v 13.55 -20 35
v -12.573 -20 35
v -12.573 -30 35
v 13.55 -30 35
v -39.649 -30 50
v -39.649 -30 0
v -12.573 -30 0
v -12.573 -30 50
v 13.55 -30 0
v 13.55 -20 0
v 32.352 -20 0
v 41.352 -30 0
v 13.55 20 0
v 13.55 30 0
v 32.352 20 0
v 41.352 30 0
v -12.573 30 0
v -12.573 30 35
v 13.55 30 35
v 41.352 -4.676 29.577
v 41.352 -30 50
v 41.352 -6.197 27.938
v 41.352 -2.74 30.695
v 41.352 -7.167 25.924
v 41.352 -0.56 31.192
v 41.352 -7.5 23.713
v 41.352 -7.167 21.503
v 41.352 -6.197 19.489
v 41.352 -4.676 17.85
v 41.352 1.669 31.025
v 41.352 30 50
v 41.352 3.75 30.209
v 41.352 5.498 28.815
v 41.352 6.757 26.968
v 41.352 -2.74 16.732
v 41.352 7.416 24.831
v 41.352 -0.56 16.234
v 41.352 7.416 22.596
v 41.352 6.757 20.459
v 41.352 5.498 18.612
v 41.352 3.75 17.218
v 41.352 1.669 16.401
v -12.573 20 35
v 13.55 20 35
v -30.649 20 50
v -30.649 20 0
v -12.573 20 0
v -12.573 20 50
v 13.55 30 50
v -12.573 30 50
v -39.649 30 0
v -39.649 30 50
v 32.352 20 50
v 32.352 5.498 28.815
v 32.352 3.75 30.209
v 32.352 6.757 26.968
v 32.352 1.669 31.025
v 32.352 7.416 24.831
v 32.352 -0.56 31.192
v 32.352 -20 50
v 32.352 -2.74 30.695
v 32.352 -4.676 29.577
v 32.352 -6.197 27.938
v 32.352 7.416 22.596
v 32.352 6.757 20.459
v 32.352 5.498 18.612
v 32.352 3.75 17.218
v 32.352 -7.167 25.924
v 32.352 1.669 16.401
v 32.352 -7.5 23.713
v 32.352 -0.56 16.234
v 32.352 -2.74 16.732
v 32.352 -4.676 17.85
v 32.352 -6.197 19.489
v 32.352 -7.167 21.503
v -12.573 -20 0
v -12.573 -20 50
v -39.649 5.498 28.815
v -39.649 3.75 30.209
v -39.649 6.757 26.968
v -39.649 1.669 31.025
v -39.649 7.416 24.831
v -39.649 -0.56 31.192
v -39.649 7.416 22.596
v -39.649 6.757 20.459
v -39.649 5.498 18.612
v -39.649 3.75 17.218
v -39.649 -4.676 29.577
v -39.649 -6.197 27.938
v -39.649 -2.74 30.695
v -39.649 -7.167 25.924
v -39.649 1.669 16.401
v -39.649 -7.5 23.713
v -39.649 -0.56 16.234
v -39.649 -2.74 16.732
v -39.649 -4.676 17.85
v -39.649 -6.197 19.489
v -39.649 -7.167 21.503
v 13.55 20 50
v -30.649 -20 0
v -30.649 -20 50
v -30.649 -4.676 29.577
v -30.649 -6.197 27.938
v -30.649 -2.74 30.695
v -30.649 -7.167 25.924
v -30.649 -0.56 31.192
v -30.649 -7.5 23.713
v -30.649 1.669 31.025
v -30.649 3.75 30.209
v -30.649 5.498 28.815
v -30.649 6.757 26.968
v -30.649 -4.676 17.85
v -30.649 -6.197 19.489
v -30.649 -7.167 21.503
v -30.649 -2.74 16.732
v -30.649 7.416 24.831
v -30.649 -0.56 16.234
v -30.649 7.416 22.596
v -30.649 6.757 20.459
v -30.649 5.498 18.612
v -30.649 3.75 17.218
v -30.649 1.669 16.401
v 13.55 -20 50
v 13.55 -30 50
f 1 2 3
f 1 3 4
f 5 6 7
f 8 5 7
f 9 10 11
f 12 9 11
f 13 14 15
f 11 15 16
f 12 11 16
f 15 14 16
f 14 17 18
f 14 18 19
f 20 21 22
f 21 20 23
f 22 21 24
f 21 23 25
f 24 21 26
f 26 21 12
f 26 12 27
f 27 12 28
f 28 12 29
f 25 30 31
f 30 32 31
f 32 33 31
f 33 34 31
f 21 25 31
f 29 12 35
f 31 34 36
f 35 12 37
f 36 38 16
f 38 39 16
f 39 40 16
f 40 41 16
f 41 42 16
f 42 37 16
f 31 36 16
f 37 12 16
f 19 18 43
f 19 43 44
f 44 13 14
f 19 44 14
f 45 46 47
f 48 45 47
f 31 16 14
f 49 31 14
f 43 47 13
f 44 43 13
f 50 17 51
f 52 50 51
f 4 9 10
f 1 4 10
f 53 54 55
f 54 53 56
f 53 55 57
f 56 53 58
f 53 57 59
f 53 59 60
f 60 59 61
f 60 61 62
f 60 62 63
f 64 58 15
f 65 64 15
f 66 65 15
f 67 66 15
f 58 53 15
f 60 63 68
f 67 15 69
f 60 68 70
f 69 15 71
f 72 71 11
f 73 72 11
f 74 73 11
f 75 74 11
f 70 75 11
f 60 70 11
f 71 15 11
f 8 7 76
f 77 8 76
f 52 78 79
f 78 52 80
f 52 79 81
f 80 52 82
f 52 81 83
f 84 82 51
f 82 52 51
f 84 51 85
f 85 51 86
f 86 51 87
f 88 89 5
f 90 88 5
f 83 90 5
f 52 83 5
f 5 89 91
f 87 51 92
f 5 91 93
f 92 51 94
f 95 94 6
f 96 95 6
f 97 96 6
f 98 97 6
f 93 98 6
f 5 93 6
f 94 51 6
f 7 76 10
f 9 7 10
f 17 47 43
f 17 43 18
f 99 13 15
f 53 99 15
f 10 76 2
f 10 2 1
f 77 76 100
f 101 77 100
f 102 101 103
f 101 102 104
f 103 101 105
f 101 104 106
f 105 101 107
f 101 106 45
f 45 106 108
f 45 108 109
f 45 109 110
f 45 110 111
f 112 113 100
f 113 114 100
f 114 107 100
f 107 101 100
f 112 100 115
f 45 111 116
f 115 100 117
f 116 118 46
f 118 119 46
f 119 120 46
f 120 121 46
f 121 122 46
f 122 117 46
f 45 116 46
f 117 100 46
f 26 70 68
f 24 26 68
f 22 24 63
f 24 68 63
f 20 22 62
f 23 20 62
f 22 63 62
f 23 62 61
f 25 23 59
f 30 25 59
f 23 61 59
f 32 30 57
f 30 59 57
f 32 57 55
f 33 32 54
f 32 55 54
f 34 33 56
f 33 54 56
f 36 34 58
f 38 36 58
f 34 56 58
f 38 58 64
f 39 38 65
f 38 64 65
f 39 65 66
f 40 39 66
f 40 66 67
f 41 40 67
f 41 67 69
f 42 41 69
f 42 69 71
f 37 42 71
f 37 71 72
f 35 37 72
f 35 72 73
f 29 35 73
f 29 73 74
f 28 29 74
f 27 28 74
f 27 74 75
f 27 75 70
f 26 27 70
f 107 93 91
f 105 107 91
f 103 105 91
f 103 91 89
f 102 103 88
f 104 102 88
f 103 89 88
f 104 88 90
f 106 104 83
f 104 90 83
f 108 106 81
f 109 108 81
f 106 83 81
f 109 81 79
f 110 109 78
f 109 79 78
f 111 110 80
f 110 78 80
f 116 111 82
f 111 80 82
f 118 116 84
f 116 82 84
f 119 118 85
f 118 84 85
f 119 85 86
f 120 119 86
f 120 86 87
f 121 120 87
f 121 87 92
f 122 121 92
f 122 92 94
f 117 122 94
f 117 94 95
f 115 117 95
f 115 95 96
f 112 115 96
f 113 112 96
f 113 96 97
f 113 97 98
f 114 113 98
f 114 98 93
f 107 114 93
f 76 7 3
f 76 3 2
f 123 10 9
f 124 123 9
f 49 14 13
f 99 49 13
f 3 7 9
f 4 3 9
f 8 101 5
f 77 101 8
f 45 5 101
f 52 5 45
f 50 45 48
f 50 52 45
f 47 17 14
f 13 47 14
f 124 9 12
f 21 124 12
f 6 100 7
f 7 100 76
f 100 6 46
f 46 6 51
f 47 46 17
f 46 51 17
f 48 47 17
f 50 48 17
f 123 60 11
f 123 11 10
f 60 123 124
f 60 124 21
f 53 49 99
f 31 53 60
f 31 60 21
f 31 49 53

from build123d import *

# Parameters (mm, degrees)
F1_DEPTH = 50
F0_W     = 26.123452
F0_H     = 10
F2_DEPTH = 35
F4_D     = 15


with BuildPart() as f1:
    # F0 (on Top) → F1 (new body)
    with BuildSketch(Plane.XY):
        Polygon((-12.573326, 30), (-39.649198, 30), (-39.649198, -30), (-12.573326, -30), (-12.573326, -20), (-30.649105, -20), (-30.649105, 20), (-12.573326, 20), align=None)
        Polygon((41.351645, 30), (13.550126, 30), (13.550126, 20), (32.351551, 20), (32.351551, -20), (13.550126, -20), (13.550126, -30), (41.351645, -30), align=None)
    extrude(amount=F1_DEPTH)

    # F4 (through all)
    with Locations(Plane.YZ.offset(41.351645)):
        with Locations((0, 23.713434)):
            Hole(F4_D / 2)


with BuildPart() as f2:
    # F0 (on Top) → F2 (new body)
    with BuildSketch(Plane.XY):
        with Locations((0.4884, -25)):
            Rectangle(F0_W, F0_H)
        with Locations((0.4884, 25)):
            Rectangle(F0_W, F0_H)
    extrude(amount=F2_DEPTH)


solid = Compound([f1.part, f2.part])
